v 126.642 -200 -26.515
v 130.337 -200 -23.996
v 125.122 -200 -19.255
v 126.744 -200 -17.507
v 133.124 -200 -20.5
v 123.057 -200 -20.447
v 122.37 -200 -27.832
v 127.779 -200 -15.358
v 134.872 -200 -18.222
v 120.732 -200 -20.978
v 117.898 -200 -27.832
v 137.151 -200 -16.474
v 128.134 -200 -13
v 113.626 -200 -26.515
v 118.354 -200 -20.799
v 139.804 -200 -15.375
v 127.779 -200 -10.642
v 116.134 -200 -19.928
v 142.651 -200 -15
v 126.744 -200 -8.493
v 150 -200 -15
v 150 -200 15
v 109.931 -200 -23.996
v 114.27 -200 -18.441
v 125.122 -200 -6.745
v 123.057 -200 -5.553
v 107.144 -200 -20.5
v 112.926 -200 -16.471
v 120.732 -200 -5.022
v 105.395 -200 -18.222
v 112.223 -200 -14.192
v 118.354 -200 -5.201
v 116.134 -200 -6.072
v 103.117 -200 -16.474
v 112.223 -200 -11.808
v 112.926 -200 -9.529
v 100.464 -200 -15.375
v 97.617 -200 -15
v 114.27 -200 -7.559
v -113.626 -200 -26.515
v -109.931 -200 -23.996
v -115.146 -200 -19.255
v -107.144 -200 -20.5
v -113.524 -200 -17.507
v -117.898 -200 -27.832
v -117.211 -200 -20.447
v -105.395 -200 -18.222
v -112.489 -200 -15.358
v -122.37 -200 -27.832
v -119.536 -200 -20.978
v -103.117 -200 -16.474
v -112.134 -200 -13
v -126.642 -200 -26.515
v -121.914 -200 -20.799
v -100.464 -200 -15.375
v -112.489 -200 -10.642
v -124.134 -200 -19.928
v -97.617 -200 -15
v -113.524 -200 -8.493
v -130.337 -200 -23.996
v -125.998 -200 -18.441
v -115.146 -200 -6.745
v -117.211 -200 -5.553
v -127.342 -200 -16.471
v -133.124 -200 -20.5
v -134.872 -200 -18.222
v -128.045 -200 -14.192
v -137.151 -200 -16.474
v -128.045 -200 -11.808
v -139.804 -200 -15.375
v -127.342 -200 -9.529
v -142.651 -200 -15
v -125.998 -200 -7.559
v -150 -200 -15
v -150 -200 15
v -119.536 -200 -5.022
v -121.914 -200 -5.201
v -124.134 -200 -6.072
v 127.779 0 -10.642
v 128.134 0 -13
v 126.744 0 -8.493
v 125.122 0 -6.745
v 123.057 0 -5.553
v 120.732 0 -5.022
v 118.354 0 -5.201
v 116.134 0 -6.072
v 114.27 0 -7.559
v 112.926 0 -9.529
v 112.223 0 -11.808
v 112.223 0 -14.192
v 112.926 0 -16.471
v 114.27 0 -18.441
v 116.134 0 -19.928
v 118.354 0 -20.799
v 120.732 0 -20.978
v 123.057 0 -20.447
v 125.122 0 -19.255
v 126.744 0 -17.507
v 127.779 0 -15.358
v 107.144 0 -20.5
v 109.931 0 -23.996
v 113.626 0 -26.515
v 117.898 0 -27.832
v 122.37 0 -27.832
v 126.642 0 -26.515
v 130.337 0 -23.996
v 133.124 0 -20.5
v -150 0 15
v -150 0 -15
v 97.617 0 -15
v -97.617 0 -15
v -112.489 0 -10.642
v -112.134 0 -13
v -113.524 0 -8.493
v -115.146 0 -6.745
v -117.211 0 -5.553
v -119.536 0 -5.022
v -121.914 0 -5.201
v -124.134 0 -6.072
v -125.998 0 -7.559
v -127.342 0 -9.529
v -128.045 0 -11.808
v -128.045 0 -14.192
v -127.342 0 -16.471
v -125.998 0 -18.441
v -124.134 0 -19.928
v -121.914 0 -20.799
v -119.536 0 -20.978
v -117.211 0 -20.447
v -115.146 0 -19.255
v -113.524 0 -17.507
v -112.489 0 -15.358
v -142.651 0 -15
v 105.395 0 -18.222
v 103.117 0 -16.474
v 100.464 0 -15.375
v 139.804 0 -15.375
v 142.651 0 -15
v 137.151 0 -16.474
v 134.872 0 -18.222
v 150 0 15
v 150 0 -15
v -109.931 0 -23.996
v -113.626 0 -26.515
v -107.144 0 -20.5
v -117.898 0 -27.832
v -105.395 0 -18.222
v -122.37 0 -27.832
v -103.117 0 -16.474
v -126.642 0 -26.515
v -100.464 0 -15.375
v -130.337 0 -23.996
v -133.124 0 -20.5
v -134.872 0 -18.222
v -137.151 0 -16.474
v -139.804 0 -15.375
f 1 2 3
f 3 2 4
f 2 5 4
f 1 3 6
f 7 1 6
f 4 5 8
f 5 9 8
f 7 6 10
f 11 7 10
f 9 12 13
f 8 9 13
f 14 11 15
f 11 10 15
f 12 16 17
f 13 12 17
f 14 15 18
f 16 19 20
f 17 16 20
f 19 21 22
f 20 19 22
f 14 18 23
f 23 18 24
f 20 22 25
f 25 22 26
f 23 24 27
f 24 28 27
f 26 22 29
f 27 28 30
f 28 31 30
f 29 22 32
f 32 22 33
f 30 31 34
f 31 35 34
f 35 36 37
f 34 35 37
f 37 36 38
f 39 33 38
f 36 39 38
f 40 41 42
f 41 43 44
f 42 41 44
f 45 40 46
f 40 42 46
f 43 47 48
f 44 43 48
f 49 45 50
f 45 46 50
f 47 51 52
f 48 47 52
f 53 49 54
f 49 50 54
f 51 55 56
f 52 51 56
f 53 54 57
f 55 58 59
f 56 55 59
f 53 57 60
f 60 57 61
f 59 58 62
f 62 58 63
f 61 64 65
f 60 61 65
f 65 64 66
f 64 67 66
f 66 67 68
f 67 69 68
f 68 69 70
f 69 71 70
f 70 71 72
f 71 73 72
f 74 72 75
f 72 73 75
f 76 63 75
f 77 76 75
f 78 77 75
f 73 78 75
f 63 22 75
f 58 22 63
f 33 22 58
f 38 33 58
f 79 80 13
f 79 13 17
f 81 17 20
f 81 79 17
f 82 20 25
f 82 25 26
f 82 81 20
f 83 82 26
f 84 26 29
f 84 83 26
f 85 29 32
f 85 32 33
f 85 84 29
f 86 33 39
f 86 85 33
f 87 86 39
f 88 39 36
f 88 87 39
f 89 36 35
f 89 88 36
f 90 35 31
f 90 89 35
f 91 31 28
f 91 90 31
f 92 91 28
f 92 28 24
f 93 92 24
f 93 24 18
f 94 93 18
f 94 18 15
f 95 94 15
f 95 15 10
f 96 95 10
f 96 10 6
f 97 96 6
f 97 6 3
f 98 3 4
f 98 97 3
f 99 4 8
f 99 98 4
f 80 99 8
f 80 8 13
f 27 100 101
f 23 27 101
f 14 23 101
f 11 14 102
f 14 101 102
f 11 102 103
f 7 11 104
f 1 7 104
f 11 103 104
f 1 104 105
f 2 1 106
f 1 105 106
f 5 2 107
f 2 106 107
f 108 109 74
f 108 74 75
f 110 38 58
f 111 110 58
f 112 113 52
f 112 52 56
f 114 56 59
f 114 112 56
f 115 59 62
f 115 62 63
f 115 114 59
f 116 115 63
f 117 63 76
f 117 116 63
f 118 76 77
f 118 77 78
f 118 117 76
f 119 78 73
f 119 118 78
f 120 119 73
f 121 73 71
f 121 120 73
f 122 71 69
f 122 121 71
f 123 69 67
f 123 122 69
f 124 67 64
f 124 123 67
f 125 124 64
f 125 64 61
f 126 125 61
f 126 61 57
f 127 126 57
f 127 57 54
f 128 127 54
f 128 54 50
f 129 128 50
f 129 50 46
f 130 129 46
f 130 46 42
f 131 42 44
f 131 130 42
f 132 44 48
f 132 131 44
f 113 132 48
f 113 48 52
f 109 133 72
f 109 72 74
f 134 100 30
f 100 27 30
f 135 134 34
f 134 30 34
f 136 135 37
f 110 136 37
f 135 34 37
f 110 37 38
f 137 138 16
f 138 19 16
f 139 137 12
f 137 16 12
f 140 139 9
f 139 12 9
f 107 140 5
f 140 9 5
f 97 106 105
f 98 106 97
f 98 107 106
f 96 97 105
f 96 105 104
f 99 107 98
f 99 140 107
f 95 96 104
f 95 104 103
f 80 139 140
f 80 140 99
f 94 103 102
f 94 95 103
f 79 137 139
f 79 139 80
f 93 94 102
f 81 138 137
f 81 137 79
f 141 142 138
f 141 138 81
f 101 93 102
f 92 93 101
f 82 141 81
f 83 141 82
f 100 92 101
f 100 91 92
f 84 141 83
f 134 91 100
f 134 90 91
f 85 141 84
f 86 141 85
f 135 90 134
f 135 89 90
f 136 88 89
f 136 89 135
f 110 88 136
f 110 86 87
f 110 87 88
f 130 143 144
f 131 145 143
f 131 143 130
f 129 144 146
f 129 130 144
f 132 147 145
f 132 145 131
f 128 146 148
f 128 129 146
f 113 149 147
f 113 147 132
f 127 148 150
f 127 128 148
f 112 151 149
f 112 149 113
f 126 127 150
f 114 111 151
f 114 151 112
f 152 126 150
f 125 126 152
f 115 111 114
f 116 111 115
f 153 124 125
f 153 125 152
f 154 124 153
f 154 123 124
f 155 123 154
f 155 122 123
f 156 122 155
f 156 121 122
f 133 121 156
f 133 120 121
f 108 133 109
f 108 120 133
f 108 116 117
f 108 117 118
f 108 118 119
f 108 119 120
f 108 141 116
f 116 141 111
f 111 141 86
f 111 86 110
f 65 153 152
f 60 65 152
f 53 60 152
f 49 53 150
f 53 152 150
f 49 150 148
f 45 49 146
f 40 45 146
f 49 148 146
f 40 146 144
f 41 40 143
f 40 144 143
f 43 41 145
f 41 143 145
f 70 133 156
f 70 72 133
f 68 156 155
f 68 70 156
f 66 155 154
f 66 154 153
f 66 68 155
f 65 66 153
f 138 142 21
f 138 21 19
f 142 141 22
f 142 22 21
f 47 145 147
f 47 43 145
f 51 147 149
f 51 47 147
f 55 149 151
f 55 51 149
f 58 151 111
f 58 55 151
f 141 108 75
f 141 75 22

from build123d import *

# Parameters (mm, degrees)
SKETCH_R  = 8
PAD_DEPTH = 200
FILLET_R  = 11


with BuildPart() as part:
    # Sketch → Pad (new body)
    with BuildSketch(Plane.XZ):
        with BuildLine():
            Line((-150, 15), (150, 15))
            Line((150, 15), (150, -15))
            Line((150, -15), (135, -15))
            ThreePointArc((105.267863, -15), (120.133931, -28), (135, -15))
            Line((105.267863, -15), (-105.267863, -15))
            ThreePointArc((-135, -15), (-120.133931, -28), (-105.267863, -15))
            Line((-135, -15), (-150, -15))
            Line((-150, -15), (-150, 15))
        make_face()
        with Locations((-120.133931, -13)):
            Circle(SKETCH_R, mode=Mode.SUBTRACT)
        with Locations((120.133931, -13)):
            Circle(SKETCH_R, mode=Mode.SUBTRACT)
    extrude(amount=PAD_DEPTH)

    # Fillet
    fillet_edges = [part.edges().sort_by_distance(p)[0] for p in [
        (-135, -100, -15),
        (-105.267863, -100, -15),
        (105.267863, -100, -15),
        (135, -100, -15),
    ]]
    fillet(fillet_edges, radius=FILLET_R)


solid = part.part
